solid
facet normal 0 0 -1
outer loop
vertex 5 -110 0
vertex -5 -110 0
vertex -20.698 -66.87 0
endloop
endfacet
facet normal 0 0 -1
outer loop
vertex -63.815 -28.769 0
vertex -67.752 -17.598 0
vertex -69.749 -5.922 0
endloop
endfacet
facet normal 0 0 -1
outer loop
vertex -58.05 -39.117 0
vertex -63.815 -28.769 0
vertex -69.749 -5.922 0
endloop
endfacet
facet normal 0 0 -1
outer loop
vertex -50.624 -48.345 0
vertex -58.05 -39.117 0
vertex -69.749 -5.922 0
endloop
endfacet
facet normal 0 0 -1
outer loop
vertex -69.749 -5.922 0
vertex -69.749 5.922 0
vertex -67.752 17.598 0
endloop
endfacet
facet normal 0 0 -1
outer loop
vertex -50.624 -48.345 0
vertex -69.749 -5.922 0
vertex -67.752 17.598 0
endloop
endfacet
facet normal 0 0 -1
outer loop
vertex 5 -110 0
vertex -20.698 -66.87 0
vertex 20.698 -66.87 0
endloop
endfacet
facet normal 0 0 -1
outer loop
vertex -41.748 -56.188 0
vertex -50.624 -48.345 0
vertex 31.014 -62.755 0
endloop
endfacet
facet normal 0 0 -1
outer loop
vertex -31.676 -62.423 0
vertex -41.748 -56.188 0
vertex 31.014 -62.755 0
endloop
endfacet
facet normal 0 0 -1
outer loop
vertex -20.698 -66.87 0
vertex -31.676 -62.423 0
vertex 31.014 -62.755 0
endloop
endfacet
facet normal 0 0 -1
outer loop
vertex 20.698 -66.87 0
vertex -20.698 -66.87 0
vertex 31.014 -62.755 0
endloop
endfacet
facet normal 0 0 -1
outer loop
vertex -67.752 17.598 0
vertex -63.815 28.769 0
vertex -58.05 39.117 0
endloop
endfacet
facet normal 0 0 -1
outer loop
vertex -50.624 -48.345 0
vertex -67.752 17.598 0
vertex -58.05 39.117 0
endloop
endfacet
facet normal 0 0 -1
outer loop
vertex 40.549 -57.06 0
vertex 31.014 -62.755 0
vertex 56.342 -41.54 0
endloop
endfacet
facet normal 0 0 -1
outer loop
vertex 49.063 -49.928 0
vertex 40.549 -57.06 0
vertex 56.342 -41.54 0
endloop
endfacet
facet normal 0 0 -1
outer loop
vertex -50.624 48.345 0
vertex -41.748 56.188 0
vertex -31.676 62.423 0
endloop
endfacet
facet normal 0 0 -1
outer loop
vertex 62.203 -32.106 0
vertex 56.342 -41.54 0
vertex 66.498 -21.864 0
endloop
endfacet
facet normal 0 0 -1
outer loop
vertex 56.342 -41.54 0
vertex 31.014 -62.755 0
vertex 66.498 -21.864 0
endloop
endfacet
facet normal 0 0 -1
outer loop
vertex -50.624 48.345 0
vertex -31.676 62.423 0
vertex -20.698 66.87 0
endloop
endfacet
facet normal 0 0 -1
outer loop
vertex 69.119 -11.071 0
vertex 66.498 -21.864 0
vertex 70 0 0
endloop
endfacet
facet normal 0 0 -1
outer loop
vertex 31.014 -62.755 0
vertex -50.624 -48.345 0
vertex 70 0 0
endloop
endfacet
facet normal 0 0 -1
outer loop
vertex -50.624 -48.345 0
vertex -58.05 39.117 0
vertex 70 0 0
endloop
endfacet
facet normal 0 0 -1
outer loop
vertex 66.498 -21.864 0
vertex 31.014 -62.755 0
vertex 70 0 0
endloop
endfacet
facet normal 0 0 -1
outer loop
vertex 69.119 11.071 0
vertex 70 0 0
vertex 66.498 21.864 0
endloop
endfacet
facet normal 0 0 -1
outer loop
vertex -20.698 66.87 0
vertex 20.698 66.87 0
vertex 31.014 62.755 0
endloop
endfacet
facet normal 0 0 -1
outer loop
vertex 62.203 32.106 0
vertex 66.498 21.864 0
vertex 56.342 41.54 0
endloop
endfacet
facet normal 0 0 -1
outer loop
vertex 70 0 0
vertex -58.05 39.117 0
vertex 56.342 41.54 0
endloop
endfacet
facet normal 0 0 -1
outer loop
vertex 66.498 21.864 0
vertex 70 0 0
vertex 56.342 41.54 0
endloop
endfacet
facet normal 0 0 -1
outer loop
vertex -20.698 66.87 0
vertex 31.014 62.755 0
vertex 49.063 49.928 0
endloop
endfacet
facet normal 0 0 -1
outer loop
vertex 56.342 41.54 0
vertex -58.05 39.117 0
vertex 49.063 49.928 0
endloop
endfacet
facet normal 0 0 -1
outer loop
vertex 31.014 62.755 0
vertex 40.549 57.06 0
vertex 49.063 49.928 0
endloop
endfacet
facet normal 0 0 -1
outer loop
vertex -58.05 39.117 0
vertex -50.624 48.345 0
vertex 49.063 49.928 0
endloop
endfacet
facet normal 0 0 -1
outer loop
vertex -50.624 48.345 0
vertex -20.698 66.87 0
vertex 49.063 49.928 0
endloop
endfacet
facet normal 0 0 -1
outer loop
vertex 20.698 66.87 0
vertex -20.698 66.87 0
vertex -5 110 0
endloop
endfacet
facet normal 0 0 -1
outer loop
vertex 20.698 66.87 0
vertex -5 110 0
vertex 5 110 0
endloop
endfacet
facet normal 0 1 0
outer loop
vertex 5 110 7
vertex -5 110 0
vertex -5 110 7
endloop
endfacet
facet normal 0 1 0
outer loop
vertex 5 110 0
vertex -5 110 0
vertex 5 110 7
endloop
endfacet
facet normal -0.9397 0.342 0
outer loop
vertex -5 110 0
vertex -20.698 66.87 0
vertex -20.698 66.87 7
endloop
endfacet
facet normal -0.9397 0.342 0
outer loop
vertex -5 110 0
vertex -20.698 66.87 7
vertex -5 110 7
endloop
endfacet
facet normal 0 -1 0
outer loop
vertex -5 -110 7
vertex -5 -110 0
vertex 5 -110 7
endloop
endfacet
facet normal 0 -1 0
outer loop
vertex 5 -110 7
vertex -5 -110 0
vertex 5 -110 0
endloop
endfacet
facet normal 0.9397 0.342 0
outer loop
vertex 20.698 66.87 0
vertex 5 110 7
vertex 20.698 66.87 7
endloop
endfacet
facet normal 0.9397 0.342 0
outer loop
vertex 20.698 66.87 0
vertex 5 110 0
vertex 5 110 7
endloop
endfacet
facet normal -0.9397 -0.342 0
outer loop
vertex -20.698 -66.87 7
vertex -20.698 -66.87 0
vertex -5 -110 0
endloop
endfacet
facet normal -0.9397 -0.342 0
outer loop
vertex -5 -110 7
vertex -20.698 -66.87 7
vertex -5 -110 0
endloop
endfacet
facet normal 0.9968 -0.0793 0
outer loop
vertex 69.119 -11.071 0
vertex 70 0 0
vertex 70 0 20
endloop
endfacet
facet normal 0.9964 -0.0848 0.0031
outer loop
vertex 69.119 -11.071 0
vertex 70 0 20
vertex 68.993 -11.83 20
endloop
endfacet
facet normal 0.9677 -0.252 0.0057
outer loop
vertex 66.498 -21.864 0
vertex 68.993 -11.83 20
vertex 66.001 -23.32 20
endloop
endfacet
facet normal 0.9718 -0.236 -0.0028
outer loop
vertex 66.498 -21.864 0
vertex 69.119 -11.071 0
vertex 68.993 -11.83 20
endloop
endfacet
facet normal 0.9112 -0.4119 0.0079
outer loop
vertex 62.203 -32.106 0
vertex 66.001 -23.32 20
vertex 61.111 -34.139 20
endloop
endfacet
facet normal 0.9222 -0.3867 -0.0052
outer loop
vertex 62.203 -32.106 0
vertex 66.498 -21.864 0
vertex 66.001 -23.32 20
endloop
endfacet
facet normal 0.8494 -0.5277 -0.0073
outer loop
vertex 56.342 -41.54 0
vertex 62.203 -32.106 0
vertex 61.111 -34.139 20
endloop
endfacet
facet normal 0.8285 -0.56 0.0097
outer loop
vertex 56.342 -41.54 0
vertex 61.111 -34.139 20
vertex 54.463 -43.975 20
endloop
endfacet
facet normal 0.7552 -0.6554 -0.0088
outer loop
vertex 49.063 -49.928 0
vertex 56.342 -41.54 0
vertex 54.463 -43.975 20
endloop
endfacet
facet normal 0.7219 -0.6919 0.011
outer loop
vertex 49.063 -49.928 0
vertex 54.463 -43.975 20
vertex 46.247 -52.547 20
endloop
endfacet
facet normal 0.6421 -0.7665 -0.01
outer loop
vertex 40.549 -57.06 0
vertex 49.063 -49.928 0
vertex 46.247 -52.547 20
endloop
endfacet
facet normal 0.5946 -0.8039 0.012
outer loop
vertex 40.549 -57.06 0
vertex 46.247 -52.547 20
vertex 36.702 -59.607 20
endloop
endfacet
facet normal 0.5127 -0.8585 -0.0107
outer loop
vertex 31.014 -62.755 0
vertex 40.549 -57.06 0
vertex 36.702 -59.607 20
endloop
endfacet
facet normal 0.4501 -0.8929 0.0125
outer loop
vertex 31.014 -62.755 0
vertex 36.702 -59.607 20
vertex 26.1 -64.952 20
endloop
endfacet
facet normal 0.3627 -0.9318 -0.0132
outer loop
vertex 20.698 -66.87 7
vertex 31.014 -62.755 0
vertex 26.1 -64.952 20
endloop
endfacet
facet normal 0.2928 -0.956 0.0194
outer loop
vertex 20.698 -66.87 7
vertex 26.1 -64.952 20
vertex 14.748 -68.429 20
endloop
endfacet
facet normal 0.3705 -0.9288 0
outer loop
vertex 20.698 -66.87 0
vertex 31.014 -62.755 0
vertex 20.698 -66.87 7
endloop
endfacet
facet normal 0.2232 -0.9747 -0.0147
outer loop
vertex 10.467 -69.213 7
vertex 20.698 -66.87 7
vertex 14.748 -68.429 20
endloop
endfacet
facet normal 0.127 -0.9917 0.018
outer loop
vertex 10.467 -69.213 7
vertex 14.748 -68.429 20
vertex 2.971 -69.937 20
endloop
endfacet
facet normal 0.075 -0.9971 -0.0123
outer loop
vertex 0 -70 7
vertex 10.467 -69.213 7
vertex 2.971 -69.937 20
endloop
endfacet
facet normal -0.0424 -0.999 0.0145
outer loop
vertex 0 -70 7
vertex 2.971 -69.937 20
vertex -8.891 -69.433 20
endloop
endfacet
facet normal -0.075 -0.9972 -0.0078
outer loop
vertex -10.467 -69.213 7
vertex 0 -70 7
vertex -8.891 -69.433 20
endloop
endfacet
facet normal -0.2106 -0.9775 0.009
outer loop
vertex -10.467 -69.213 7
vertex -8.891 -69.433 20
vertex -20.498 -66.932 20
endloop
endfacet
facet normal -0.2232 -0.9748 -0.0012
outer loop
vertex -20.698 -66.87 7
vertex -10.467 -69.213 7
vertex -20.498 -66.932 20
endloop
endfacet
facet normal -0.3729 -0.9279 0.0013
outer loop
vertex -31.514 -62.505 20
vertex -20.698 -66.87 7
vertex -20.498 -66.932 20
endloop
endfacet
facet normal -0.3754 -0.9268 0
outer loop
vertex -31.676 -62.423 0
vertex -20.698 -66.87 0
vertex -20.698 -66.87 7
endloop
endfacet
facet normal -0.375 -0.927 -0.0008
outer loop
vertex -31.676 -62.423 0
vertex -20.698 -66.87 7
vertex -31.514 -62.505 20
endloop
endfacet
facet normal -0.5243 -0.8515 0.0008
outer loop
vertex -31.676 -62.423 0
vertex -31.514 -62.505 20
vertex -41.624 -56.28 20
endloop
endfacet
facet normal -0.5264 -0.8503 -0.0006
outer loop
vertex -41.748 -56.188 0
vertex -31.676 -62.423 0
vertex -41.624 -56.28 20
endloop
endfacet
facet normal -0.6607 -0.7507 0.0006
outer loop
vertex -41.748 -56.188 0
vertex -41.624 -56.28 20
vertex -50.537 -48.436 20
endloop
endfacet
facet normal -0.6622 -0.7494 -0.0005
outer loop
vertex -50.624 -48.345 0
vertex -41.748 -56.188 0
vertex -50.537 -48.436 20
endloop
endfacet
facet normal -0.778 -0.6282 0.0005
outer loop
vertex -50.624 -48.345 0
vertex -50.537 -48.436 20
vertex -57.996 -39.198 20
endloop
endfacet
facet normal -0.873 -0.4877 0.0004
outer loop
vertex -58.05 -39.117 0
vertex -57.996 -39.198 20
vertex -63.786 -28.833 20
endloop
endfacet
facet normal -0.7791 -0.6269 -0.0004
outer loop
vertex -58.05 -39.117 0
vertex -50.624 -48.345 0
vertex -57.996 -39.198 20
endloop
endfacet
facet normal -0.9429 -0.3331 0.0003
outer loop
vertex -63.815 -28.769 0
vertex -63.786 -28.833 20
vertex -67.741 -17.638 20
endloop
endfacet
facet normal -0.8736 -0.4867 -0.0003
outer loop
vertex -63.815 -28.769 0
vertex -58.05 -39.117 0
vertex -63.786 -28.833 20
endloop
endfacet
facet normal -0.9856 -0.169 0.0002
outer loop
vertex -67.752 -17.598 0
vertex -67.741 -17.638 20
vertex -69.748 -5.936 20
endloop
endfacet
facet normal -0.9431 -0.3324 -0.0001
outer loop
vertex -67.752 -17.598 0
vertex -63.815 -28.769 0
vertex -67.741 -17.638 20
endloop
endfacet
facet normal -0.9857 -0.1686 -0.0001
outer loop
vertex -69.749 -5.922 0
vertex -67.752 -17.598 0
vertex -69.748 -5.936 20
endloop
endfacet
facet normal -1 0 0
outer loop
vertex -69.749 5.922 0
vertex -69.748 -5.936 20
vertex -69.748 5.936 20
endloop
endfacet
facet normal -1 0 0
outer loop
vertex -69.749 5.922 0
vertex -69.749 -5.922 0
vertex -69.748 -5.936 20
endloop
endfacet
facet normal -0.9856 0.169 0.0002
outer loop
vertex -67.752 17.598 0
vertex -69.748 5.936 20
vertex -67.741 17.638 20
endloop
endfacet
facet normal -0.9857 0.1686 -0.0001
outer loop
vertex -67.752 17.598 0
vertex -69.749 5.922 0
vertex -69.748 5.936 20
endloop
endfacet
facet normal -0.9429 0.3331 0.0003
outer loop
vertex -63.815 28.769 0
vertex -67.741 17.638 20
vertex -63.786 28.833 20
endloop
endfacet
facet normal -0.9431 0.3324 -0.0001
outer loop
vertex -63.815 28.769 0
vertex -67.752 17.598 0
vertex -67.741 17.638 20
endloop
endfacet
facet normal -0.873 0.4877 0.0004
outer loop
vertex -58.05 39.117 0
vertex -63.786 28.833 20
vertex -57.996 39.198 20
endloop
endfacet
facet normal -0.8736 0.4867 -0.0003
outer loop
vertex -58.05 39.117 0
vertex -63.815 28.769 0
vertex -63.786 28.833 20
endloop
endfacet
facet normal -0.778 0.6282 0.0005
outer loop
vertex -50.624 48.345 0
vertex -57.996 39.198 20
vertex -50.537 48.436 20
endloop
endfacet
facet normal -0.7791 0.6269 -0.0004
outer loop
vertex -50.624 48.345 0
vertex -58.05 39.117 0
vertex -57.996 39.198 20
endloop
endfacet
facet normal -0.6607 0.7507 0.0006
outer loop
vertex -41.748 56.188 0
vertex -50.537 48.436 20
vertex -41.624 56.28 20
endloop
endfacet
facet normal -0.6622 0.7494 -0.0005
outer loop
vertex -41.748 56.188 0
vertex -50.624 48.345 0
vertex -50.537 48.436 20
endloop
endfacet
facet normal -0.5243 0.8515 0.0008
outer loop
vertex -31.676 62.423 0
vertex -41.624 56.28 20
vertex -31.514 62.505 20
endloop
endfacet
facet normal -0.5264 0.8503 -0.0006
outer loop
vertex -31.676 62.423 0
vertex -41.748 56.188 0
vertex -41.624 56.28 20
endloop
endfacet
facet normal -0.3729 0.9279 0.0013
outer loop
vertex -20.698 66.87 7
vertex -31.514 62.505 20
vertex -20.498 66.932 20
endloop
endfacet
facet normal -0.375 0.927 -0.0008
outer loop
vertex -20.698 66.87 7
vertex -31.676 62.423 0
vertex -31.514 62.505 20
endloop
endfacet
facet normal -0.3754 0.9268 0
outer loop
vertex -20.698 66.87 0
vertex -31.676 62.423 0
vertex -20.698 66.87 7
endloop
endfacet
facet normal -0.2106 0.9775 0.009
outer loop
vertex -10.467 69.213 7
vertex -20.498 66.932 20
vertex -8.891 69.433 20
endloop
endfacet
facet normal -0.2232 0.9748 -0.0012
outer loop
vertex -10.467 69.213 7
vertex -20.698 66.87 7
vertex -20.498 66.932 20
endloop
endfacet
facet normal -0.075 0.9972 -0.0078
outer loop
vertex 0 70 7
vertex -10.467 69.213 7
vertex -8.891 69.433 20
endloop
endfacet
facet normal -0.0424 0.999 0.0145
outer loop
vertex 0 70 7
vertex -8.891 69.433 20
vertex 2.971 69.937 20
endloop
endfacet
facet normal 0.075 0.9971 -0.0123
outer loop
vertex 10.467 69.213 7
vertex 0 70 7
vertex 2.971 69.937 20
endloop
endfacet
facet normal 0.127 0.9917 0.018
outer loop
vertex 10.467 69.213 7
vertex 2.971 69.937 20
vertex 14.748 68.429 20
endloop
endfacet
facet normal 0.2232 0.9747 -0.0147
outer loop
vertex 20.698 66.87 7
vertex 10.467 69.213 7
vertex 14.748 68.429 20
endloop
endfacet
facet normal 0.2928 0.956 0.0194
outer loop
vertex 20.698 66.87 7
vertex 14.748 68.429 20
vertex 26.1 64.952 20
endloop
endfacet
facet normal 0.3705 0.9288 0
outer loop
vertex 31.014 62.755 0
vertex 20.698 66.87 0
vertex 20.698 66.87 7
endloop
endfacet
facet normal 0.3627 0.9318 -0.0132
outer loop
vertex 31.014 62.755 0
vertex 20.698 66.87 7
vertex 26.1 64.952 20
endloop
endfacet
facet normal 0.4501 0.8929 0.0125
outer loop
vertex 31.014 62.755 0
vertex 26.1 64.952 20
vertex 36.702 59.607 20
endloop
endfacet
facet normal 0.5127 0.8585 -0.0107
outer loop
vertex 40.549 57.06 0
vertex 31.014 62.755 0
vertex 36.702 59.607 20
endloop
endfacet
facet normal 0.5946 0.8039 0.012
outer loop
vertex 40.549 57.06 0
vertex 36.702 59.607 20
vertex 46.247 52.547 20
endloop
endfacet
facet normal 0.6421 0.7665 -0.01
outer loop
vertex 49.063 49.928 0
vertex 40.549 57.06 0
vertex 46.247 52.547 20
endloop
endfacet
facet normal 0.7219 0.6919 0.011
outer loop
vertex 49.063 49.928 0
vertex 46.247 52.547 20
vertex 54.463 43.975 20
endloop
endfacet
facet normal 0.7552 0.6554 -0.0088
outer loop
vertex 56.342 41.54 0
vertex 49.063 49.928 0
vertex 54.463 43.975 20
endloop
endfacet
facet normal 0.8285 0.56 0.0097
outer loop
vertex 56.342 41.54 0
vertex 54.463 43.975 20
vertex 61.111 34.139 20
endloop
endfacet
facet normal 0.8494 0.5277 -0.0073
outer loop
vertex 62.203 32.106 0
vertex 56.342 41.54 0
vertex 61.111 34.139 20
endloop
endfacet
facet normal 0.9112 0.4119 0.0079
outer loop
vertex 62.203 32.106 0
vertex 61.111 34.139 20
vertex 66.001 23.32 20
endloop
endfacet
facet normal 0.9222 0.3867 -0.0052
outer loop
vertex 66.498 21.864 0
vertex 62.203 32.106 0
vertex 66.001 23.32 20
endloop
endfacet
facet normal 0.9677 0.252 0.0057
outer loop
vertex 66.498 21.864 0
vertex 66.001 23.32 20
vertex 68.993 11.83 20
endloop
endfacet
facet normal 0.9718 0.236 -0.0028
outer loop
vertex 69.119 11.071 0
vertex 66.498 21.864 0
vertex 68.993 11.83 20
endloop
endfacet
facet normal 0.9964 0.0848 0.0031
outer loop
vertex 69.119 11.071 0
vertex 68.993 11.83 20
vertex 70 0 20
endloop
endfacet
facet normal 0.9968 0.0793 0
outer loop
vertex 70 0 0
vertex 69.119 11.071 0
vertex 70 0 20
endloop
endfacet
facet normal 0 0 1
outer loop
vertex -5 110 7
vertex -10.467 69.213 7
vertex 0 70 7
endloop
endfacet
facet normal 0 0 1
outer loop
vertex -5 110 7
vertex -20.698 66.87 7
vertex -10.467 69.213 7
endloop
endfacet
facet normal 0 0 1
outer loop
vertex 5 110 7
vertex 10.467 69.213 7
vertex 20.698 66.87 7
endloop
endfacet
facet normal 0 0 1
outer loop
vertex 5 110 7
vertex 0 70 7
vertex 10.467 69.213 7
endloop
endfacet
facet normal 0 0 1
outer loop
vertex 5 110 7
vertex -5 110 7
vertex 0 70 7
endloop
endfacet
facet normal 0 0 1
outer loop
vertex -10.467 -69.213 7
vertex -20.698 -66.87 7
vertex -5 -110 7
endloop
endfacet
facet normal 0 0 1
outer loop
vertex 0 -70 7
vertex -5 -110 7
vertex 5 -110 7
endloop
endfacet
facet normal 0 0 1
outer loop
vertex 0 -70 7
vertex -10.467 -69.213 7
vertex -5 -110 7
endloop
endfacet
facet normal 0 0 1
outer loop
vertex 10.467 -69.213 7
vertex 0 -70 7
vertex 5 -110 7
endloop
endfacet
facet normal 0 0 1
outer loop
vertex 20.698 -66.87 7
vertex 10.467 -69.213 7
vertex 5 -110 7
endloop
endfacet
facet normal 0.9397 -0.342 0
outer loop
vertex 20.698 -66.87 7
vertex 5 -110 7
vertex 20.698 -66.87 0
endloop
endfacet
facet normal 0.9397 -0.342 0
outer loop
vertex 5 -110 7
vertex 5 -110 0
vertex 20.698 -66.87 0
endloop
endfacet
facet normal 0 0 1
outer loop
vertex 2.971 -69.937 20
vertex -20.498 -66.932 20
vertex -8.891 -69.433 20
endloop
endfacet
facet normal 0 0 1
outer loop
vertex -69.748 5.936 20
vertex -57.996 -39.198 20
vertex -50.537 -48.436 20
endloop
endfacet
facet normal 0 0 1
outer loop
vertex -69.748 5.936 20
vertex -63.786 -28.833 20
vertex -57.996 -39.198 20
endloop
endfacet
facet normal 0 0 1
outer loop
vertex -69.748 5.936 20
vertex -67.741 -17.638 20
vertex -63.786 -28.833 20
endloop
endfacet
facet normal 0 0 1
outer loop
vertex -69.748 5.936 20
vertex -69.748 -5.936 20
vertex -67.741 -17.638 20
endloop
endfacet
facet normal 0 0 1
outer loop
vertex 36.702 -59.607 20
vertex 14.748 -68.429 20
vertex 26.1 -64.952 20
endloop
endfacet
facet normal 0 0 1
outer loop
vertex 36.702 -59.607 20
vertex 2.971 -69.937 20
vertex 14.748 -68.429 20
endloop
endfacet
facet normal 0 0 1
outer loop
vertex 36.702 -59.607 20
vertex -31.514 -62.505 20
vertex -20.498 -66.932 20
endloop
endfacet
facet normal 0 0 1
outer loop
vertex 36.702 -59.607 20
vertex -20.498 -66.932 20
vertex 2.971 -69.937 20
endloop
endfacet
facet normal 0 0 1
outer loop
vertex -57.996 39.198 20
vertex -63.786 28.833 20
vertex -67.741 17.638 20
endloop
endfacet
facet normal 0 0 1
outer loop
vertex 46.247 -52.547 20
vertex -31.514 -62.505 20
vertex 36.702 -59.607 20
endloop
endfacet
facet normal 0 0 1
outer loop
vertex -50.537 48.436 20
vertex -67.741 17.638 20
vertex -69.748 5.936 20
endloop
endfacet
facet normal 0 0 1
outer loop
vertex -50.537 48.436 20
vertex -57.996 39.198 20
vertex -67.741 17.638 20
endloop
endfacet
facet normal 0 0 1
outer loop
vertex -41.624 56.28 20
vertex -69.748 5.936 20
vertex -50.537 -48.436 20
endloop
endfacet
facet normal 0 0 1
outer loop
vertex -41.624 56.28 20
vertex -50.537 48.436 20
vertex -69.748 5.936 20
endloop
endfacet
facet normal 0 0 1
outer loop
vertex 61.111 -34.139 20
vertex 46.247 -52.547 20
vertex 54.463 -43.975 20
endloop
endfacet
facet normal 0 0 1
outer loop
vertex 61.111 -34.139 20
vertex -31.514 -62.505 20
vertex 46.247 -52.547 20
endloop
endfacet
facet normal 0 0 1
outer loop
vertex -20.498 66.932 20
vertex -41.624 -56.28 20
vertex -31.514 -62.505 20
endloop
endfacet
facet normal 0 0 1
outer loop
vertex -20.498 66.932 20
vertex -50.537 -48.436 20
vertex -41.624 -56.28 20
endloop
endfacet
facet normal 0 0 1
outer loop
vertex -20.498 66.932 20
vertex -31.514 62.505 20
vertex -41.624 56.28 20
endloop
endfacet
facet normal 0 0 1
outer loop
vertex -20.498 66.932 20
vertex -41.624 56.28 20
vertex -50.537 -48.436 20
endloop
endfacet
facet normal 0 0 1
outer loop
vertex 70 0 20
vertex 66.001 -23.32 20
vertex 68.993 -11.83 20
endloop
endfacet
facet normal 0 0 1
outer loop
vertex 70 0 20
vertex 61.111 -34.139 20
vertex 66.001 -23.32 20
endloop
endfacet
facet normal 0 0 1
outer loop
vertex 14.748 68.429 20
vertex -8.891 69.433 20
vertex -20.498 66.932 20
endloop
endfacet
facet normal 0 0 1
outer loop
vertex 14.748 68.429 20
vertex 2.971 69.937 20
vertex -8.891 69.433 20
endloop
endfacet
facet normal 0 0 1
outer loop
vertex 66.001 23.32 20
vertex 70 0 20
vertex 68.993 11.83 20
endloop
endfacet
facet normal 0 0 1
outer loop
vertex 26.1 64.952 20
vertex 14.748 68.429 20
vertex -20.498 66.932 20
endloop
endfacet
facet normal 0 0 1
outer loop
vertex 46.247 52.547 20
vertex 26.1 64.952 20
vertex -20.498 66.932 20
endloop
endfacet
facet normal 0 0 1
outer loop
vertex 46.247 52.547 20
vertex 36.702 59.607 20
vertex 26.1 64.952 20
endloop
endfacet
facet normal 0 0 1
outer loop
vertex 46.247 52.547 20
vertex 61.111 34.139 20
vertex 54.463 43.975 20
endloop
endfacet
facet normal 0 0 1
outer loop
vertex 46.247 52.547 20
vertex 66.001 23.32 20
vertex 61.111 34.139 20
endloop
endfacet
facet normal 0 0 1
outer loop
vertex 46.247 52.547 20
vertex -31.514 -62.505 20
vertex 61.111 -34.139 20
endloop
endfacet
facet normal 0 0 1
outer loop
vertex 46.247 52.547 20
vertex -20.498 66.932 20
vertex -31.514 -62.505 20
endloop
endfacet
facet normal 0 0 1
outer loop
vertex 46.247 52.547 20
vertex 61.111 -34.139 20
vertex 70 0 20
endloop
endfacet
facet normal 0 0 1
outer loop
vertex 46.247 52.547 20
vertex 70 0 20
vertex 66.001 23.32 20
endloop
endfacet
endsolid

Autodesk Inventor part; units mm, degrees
ref_plane "YZ Plane" through (0, 0, 0) normal (1, 0, 0) x (0, 1, 0)
ref_plane "XZ Plane" through (0, 0, 0) normal (0, 1, 0) x (-1, 0, 0)
ref_plane "XY Plane" through (0, 0, 0) normal (0, 0, 1) x (1, 0, 0)
sketch "Skizze2" plane through (0, 0, 0) normal (0, 0, 1) x (1, 0, 0)
  line L0 (-117.4666, 197.4366) -> (107.72, 197.4366) construction
  line L1 (107.72, 197.4366) -> (107.72, -200.7323) construction
  line L2 (107.72, -200.7323) -> (-117.4666, -200.7323) construction
  line L3 (-117.4666, -200.7323) -> (-117.4666, 197.4366) construction
  circle A0 centre (0, 0) radius 70
  line L4 (-20.6981, 66.87) -> (-5, 110)
  line L5 (-5, 110) -> (5, 110)
  line L6 (5, 110) -> (20.6981, 66.87)
  line L7 (-20.6981, -66.87) -> (-5, -110)
  line L8 (-5, -110) -> (5, -110)
  line L9 (5, -110) -> (20.6981, -66.87)
  line L10 (0, 110) -> (0, 0)
  line L11 (0, 0) -> (0, -110)
  dimension "d3" = 110
  dimension "d4" = 110
  dimension "d5" = 110
  dimension "d8" = 140
  dimension "d9" = 110
  dimension "d10" = 110
  dimension "d11" = 110
  dimension "d12" = 10
  dimension "d13" = 10
extrude "Extrusion1" add sketch "Skizze2" along normal blind 20 contours A0 L11 L10 | L10 L11 A0
extrude "Extrusion2" add sketch "Skizze2" along normal blind 7 contours A0 L10 L5 L6 | L9 L8 L11 A0 | A0 L4 L5 L10 | L11 L8 L7 A0
sketch "Skizze3" plane through (0, 0, 20) normal (0, 0, 1) x (1, 0, 0)
  line L0 (-65, 65) -> (65, 65) construction
  line L1 (65, 65) -> (65, -65.4377) construction
  line L2 (65, -65.4377) -> (-65, -65.4377) construction
  line L3 (-65, -65.4377) -> (-65, 65) construction
  point P0 (0, 0)
properties part number "waage" material "PC/ABS-Kunststoff, 3DDruck, PLA"
